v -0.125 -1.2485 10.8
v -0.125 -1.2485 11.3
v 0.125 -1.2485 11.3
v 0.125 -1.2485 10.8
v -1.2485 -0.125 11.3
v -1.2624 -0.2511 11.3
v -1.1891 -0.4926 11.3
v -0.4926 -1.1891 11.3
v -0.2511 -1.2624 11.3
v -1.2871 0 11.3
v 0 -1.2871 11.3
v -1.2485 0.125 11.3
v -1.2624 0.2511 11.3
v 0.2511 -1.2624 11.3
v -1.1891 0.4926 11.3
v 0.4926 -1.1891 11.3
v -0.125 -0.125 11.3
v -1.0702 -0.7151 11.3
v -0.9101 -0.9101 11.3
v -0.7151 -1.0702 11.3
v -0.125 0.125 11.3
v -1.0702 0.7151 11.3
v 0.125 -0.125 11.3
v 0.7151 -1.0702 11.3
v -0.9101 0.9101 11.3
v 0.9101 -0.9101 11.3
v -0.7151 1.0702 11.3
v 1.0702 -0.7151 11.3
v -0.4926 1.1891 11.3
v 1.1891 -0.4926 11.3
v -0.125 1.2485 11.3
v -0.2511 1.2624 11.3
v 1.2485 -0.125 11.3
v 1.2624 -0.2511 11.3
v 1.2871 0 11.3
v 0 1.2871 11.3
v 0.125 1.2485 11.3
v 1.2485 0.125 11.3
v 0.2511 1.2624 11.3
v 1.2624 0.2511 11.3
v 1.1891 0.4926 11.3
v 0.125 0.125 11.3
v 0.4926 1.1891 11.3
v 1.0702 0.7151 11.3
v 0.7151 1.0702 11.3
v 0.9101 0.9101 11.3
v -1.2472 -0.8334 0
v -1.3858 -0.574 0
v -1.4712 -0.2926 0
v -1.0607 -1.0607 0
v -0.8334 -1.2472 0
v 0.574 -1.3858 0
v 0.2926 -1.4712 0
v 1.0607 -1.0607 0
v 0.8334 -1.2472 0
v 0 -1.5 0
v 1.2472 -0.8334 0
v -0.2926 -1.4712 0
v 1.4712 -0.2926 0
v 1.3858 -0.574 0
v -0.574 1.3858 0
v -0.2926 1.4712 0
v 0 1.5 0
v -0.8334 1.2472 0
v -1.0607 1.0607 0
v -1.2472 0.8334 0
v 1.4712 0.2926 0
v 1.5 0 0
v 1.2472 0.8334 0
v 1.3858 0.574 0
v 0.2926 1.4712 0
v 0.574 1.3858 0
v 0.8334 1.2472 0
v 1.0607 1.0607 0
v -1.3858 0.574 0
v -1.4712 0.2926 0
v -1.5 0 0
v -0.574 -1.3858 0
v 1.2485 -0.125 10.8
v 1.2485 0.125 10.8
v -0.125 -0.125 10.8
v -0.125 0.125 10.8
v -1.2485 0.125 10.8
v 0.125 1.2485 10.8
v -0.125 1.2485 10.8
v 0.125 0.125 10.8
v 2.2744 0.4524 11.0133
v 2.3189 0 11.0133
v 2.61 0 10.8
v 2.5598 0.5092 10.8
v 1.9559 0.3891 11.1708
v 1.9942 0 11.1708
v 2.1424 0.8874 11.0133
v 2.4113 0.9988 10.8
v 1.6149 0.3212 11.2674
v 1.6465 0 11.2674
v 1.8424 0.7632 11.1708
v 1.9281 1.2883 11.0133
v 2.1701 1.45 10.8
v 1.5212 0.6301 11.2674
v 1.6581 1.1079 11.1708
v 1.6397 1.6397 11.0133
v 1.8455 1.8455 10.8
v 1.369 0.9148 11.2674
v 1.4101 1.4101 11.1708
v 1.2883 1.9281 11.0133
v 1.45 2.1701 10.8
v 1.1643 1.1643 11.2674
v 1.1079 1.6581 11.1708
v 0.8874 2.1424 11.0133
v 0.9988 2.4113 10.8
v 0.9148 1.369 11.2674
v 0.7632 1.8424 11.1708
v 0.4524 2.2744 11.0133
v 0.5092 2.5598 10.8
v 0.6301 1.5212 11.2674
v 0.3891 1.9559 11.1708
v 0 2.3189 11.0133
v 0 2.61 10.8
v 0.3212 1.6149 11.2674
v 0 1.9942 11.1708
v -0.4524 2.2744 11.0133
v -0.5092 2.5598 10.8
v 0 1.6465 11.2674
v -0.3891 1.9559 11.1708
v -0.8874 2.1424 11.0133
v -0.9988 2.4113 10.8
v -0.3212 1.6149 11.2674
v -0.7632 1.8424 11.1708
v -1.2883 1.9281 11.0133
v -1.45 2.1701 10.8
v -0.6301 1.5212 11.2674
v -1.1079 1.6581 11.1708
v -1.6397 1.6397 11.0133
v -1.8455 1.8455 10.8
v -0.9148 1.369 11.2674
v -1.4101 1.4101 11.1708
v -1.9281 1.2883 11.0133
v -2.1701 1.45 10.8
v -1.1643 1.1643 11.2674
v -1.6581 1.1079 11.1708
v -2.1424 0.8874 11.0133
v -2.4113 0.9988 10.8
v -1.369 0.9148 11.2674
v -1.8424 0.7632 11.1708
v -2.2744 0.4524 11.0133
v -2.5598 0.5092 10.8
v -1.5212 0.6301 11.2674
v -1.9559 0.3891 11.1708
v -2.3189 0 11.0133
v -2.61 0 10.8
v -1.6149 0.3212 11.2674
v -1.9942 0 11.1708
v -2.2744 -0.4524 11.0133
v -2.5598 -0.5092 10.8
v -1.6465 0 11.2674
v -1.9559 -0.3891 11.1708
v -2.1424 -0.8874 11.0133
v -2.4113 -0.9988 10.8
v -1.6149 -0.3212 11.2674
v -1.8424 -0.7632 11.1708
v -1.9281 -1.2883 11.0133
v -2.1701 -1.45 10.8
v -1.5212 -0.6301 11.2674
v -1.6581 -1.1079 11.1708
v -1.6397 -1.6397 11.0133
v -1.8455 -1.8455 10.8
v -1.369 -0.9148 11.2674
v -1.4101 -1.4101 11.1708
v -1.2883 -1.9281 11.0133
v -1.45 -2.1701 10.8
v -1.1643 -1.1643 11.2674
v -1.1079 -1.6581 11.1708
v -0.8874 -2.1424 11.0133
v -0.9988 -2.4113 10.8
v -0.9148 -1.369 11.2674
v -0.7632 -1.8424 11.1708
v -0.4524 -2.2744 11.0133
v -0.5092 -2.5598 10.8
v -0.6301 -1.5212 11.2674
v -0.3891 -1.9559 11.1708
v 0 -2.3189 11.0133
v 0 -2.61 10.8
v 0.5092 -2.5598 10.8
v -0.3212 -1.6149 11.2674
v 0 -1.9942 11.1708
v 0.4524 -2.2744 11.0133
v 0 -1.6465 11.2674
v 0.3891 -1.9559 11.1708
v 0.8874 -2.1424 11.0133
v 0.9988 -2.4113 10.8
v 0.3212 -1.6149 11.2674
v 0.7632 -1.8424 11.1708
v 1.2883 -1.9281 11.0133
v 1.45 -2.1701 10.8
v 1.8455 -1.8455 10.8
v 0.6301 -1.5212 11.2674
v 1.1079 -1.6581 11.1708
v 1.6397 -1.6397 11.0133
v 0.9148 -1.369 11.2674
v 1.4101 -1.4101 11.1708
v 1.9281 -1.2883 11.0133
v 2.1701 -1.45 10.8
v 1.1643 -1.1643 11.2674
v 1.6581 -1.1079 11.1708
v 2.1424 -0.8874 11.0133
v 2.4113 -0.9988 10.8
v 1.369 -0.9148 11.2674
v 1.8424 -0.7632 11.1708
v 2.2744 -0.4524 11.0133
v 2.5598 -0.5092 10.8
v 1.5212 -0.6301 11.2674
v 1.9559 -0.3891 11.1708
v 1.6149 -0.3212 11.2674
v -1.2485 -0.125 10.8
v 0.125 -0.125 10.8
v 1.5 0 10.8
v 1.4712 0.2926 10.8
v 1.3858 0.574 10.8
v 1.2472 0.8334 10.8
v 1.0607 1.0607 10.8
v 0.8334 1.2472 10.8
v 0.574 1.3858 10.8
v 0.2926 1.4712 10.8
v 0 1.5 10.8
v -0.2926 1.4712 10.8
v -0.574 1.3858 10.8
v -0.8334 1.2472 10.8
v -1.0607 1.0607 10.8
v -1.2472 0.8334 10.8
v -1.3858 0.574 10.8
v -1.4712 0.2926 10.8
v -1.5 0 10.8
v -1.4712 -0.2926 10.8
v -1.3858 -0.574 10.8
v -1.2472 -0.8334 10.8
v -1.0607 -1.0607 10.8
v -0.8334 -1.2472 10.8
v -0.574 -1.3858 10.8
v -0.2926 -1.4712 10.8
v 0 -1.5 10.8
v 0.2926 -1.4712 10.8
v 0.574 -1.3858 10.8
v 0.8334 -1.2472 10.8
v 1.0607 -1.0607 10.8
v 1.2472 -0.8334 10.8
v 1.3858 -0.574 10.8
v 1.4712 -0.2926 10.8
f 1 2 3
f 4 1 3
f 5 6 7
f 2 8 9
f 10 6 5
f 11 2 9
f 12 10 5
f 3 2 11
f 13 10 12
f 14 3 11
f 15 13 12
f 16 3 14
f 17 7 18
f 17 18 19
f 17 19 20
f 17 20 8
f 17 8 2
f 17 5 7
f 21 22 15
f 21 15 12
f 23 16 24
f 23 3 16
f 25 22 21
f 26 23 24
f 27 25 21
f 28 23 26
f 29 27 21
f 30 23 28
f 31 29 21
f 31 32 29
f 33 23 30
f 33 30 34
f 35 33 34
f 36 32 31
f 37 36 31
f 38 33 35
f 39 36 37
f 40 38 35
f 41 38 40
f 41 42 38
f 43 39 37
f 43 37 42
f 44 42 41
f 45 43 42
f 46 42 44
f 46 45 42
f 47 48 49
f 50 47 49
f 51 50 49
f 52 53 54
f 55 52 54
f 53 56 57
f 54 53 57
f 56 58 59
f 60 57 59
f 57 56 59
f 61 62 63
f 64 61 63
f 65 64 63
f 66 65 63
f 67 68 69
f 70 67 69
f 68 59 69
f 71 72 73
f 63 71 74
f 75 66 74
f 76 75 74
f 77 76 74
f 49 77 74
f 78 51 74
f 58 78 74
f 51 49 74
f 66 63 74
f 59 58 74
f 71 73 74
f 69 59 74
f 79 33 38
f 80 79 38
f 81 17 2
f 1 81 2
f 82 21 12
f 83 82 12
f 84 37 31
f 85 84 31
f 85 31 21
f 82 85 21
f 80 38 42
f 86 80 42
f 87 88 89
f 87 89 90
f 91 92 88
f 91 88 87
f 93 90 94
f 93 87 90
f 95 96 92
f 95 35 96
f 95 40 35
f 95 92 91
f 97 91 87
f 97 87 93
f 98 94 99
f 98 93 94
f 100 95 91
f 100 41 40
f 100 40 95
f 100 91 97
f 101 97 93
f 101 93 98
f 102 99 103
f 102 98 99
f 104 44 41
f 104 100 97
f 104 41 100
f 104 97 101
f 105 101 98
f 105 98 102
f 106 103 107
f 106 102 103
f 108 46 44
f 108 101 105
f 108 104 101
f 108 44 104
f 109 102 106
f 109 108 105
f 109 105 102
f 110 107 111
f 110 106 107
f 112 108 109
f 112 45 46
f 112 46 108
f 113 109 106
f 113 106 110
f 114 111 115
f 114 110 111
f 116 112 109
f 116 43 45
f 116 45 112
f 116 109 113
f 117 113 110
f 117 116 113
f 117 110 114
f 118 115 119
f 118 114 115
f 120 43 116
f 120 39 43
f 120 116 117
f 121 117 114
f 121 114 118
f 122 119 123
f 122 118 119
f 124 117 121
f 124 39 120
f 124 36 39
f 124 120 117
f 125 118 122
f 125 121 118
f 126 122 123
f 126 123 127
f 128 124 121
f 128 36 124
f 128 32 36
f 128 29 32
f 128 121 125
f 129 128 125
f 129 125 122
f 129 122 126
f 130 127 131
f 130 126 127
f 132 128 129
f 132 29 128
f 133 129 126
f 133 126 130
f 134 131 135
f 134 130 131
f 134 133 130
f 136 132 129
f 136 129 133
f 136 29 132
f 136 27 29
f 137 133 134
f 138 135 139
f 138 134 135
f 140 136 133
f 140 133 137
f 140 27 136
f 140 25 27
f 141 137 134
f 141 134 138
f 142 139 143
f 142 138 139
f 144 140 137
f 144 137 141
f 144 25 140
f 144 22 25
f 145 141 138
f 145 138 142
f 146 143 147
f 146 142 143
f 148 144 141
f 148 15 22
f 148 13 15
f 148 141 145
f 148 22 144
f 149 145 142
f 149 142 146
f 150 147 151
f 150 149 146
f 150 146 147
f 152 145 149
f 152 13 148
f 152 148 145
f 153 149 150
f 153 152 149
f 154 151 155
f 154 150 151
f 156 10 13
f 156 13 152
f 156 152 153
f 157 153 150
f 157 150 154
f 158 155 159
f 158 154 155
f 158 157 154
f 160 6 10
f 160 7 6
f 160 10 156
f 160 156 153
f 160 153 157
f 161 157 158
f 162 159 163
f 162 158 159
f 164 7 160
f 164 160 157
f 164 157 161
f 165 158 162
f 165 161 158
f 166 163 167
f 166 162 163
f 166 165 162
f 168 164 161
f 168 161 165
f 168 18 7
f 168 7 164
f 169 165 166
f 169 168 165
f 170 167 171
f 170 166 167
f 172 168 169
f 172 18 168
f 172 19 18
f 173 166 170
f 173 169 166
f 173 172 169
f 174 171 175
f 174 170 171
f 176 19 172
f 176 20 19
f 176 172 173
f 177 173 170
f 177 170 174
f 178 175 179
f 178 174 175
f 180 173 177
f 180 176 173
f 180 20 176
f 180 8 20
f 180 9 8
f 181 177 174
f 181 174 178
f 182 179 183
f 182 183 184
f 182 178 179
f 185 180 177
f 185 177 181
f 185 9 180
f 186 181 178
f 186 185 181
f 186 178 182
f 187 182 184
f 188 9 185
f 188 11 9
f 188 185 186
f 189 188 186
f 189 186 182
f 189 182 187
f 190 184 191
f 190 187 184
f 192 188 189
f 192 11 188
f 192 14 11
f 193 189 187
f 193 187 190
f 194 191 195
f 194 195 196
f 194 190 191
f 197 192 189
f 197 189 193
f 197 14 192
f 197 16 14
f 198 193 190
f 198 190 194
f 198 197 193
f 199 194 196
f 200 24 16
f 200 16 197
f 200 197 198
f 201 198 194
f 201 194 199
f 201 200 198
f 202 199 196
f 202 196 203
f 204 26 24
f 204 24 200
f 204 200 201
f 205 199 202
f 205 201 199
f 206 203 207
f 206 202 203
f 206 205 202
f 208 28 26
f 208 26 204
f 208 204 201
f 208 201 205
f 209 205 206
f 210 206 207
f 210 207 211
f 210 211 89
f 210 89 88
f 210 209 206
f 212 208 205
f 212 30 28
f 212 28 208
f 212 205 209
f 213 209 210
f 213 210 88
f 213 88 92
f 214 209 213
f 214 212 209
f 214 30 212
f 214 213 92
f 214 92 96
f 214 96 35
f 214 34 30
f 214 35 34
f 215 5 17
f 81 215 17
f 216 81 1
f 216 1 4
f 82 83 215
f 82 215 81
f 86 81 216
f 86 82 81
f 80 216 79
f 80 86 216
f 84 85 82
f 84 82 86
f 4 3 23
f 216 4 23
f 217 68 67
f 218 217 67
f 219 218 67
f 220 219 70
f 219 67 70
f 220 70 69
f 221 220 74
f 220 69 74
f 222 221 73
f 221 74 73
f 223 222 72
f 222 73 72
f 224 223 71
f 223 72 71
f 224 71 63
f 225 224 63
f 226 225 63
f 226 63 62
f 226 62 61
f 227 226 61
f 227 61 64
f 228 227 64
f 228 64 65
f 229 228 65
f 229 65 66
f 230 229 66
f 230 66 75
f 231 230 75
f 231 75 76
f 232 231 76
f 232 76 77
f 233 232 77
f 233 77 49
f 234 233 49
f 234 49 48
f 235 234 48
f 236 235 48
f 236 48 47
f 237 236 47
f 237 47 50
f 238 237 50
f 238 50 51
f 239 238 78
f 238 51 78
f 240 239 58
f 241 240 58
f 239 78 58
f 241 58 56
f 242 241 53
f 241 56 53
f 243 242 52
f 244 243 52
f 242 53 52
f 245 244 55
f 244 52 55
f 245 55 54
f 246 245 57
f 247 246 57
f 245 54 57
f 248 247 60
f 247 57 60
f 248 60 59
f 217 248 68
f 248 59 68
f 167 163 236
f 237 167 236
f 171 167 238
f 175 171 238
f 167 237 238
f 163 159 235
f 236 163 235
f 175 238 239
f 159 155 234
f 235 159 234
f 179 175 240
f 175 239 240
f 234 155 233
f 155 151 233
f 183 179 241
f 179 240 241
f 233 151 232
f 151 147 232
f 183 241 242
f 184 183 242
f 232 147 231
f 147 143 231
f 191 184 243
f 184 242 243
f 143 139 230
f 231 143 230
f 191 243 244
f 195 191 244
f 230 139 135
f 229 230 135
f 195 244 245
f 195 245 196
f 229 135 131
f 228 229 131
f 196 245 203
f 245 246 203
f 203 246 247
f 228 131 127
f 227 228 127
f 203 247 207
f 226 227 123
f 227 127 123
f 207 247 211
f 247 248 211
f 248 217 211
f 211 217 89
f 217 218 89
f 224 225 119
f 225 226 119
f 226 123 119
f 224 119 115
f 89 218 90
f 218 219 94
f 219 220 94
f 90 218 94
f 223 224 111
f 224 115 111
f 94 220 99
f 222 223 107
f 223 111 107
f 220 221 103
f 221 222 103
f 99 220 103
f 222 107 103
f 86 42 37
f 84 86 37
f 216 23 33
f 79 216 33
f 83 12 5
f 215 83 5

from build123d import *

# Parameters (mm, degrees)
F0_R     = 1.5
F1_DEPTH = 11.3
F2_R     = 2.61
F2_R_2   = 1.5
F3_DEPTH = 0.5
F5_DEPTH = 0.5


# Not quite as in the source:
# - a fillet or chamfer that OpenCascade refuses, or shapes differently, is made with other operations: its cross-section is extruded or revolved along the edge and cut away or added


with BuildPart() as f1:
    # F0 (on Top) → F1 (new body)
    with BuildSketch(Plane.XY):
        Circle(F0_R)
    extrude(amount=F1_DEPTH)

    # F2 (on face) → F3 (join)
    with BuildSketch(Plane.XY.offset(11.3)):
        Circle(F2_R)
        Circle(F2_R_2, mode=Mode.SUBTRACT)
    extrude(amount=-F3_DEPTH)

    # F4: fillet of radius 2 on 1 edges, made by hand

    # F4_s1 → F4_t2 (revolve, cut)
    with BuildSketch(Plane.XZ):
        with BuildLine():
            ThreePointArc((2.61, 10.8), (1.9942311257, 11.1708286934), (1.2871243445, 11.3))
            Line((1.2871243445, 11.3), (2.61, 11.3))
            Line((2.61, 11.3), (2.61, 10.8))
        make_face()
    revolve(axis=Axis((0, 0, 11.3), (0, 0, 1)), mode=Mode.SUBTRACT)

    # F2 (on face) → F5 (cut)
    with BuildSketch(Plane.XY.offset(11.3)):
        Polygon((-1.2485300168, 0.125), (-1.2485300168, -0.125), (-0.125, -0.125), (-0.125, -1.2485300168), (0.125, -1.2485300168), (0.125, -0.125), (1.2485300168, -0.125), (1.2485300168, 0.125), (0.125, 0.125), (0.125, 1.2485300168), (-0.125, 1.2485300168), (-0.125, 0.125), align=None)
    extrude(amount=-F5_DEPTH, mode=Mode.SUBTRACT)


solid = f1.part
